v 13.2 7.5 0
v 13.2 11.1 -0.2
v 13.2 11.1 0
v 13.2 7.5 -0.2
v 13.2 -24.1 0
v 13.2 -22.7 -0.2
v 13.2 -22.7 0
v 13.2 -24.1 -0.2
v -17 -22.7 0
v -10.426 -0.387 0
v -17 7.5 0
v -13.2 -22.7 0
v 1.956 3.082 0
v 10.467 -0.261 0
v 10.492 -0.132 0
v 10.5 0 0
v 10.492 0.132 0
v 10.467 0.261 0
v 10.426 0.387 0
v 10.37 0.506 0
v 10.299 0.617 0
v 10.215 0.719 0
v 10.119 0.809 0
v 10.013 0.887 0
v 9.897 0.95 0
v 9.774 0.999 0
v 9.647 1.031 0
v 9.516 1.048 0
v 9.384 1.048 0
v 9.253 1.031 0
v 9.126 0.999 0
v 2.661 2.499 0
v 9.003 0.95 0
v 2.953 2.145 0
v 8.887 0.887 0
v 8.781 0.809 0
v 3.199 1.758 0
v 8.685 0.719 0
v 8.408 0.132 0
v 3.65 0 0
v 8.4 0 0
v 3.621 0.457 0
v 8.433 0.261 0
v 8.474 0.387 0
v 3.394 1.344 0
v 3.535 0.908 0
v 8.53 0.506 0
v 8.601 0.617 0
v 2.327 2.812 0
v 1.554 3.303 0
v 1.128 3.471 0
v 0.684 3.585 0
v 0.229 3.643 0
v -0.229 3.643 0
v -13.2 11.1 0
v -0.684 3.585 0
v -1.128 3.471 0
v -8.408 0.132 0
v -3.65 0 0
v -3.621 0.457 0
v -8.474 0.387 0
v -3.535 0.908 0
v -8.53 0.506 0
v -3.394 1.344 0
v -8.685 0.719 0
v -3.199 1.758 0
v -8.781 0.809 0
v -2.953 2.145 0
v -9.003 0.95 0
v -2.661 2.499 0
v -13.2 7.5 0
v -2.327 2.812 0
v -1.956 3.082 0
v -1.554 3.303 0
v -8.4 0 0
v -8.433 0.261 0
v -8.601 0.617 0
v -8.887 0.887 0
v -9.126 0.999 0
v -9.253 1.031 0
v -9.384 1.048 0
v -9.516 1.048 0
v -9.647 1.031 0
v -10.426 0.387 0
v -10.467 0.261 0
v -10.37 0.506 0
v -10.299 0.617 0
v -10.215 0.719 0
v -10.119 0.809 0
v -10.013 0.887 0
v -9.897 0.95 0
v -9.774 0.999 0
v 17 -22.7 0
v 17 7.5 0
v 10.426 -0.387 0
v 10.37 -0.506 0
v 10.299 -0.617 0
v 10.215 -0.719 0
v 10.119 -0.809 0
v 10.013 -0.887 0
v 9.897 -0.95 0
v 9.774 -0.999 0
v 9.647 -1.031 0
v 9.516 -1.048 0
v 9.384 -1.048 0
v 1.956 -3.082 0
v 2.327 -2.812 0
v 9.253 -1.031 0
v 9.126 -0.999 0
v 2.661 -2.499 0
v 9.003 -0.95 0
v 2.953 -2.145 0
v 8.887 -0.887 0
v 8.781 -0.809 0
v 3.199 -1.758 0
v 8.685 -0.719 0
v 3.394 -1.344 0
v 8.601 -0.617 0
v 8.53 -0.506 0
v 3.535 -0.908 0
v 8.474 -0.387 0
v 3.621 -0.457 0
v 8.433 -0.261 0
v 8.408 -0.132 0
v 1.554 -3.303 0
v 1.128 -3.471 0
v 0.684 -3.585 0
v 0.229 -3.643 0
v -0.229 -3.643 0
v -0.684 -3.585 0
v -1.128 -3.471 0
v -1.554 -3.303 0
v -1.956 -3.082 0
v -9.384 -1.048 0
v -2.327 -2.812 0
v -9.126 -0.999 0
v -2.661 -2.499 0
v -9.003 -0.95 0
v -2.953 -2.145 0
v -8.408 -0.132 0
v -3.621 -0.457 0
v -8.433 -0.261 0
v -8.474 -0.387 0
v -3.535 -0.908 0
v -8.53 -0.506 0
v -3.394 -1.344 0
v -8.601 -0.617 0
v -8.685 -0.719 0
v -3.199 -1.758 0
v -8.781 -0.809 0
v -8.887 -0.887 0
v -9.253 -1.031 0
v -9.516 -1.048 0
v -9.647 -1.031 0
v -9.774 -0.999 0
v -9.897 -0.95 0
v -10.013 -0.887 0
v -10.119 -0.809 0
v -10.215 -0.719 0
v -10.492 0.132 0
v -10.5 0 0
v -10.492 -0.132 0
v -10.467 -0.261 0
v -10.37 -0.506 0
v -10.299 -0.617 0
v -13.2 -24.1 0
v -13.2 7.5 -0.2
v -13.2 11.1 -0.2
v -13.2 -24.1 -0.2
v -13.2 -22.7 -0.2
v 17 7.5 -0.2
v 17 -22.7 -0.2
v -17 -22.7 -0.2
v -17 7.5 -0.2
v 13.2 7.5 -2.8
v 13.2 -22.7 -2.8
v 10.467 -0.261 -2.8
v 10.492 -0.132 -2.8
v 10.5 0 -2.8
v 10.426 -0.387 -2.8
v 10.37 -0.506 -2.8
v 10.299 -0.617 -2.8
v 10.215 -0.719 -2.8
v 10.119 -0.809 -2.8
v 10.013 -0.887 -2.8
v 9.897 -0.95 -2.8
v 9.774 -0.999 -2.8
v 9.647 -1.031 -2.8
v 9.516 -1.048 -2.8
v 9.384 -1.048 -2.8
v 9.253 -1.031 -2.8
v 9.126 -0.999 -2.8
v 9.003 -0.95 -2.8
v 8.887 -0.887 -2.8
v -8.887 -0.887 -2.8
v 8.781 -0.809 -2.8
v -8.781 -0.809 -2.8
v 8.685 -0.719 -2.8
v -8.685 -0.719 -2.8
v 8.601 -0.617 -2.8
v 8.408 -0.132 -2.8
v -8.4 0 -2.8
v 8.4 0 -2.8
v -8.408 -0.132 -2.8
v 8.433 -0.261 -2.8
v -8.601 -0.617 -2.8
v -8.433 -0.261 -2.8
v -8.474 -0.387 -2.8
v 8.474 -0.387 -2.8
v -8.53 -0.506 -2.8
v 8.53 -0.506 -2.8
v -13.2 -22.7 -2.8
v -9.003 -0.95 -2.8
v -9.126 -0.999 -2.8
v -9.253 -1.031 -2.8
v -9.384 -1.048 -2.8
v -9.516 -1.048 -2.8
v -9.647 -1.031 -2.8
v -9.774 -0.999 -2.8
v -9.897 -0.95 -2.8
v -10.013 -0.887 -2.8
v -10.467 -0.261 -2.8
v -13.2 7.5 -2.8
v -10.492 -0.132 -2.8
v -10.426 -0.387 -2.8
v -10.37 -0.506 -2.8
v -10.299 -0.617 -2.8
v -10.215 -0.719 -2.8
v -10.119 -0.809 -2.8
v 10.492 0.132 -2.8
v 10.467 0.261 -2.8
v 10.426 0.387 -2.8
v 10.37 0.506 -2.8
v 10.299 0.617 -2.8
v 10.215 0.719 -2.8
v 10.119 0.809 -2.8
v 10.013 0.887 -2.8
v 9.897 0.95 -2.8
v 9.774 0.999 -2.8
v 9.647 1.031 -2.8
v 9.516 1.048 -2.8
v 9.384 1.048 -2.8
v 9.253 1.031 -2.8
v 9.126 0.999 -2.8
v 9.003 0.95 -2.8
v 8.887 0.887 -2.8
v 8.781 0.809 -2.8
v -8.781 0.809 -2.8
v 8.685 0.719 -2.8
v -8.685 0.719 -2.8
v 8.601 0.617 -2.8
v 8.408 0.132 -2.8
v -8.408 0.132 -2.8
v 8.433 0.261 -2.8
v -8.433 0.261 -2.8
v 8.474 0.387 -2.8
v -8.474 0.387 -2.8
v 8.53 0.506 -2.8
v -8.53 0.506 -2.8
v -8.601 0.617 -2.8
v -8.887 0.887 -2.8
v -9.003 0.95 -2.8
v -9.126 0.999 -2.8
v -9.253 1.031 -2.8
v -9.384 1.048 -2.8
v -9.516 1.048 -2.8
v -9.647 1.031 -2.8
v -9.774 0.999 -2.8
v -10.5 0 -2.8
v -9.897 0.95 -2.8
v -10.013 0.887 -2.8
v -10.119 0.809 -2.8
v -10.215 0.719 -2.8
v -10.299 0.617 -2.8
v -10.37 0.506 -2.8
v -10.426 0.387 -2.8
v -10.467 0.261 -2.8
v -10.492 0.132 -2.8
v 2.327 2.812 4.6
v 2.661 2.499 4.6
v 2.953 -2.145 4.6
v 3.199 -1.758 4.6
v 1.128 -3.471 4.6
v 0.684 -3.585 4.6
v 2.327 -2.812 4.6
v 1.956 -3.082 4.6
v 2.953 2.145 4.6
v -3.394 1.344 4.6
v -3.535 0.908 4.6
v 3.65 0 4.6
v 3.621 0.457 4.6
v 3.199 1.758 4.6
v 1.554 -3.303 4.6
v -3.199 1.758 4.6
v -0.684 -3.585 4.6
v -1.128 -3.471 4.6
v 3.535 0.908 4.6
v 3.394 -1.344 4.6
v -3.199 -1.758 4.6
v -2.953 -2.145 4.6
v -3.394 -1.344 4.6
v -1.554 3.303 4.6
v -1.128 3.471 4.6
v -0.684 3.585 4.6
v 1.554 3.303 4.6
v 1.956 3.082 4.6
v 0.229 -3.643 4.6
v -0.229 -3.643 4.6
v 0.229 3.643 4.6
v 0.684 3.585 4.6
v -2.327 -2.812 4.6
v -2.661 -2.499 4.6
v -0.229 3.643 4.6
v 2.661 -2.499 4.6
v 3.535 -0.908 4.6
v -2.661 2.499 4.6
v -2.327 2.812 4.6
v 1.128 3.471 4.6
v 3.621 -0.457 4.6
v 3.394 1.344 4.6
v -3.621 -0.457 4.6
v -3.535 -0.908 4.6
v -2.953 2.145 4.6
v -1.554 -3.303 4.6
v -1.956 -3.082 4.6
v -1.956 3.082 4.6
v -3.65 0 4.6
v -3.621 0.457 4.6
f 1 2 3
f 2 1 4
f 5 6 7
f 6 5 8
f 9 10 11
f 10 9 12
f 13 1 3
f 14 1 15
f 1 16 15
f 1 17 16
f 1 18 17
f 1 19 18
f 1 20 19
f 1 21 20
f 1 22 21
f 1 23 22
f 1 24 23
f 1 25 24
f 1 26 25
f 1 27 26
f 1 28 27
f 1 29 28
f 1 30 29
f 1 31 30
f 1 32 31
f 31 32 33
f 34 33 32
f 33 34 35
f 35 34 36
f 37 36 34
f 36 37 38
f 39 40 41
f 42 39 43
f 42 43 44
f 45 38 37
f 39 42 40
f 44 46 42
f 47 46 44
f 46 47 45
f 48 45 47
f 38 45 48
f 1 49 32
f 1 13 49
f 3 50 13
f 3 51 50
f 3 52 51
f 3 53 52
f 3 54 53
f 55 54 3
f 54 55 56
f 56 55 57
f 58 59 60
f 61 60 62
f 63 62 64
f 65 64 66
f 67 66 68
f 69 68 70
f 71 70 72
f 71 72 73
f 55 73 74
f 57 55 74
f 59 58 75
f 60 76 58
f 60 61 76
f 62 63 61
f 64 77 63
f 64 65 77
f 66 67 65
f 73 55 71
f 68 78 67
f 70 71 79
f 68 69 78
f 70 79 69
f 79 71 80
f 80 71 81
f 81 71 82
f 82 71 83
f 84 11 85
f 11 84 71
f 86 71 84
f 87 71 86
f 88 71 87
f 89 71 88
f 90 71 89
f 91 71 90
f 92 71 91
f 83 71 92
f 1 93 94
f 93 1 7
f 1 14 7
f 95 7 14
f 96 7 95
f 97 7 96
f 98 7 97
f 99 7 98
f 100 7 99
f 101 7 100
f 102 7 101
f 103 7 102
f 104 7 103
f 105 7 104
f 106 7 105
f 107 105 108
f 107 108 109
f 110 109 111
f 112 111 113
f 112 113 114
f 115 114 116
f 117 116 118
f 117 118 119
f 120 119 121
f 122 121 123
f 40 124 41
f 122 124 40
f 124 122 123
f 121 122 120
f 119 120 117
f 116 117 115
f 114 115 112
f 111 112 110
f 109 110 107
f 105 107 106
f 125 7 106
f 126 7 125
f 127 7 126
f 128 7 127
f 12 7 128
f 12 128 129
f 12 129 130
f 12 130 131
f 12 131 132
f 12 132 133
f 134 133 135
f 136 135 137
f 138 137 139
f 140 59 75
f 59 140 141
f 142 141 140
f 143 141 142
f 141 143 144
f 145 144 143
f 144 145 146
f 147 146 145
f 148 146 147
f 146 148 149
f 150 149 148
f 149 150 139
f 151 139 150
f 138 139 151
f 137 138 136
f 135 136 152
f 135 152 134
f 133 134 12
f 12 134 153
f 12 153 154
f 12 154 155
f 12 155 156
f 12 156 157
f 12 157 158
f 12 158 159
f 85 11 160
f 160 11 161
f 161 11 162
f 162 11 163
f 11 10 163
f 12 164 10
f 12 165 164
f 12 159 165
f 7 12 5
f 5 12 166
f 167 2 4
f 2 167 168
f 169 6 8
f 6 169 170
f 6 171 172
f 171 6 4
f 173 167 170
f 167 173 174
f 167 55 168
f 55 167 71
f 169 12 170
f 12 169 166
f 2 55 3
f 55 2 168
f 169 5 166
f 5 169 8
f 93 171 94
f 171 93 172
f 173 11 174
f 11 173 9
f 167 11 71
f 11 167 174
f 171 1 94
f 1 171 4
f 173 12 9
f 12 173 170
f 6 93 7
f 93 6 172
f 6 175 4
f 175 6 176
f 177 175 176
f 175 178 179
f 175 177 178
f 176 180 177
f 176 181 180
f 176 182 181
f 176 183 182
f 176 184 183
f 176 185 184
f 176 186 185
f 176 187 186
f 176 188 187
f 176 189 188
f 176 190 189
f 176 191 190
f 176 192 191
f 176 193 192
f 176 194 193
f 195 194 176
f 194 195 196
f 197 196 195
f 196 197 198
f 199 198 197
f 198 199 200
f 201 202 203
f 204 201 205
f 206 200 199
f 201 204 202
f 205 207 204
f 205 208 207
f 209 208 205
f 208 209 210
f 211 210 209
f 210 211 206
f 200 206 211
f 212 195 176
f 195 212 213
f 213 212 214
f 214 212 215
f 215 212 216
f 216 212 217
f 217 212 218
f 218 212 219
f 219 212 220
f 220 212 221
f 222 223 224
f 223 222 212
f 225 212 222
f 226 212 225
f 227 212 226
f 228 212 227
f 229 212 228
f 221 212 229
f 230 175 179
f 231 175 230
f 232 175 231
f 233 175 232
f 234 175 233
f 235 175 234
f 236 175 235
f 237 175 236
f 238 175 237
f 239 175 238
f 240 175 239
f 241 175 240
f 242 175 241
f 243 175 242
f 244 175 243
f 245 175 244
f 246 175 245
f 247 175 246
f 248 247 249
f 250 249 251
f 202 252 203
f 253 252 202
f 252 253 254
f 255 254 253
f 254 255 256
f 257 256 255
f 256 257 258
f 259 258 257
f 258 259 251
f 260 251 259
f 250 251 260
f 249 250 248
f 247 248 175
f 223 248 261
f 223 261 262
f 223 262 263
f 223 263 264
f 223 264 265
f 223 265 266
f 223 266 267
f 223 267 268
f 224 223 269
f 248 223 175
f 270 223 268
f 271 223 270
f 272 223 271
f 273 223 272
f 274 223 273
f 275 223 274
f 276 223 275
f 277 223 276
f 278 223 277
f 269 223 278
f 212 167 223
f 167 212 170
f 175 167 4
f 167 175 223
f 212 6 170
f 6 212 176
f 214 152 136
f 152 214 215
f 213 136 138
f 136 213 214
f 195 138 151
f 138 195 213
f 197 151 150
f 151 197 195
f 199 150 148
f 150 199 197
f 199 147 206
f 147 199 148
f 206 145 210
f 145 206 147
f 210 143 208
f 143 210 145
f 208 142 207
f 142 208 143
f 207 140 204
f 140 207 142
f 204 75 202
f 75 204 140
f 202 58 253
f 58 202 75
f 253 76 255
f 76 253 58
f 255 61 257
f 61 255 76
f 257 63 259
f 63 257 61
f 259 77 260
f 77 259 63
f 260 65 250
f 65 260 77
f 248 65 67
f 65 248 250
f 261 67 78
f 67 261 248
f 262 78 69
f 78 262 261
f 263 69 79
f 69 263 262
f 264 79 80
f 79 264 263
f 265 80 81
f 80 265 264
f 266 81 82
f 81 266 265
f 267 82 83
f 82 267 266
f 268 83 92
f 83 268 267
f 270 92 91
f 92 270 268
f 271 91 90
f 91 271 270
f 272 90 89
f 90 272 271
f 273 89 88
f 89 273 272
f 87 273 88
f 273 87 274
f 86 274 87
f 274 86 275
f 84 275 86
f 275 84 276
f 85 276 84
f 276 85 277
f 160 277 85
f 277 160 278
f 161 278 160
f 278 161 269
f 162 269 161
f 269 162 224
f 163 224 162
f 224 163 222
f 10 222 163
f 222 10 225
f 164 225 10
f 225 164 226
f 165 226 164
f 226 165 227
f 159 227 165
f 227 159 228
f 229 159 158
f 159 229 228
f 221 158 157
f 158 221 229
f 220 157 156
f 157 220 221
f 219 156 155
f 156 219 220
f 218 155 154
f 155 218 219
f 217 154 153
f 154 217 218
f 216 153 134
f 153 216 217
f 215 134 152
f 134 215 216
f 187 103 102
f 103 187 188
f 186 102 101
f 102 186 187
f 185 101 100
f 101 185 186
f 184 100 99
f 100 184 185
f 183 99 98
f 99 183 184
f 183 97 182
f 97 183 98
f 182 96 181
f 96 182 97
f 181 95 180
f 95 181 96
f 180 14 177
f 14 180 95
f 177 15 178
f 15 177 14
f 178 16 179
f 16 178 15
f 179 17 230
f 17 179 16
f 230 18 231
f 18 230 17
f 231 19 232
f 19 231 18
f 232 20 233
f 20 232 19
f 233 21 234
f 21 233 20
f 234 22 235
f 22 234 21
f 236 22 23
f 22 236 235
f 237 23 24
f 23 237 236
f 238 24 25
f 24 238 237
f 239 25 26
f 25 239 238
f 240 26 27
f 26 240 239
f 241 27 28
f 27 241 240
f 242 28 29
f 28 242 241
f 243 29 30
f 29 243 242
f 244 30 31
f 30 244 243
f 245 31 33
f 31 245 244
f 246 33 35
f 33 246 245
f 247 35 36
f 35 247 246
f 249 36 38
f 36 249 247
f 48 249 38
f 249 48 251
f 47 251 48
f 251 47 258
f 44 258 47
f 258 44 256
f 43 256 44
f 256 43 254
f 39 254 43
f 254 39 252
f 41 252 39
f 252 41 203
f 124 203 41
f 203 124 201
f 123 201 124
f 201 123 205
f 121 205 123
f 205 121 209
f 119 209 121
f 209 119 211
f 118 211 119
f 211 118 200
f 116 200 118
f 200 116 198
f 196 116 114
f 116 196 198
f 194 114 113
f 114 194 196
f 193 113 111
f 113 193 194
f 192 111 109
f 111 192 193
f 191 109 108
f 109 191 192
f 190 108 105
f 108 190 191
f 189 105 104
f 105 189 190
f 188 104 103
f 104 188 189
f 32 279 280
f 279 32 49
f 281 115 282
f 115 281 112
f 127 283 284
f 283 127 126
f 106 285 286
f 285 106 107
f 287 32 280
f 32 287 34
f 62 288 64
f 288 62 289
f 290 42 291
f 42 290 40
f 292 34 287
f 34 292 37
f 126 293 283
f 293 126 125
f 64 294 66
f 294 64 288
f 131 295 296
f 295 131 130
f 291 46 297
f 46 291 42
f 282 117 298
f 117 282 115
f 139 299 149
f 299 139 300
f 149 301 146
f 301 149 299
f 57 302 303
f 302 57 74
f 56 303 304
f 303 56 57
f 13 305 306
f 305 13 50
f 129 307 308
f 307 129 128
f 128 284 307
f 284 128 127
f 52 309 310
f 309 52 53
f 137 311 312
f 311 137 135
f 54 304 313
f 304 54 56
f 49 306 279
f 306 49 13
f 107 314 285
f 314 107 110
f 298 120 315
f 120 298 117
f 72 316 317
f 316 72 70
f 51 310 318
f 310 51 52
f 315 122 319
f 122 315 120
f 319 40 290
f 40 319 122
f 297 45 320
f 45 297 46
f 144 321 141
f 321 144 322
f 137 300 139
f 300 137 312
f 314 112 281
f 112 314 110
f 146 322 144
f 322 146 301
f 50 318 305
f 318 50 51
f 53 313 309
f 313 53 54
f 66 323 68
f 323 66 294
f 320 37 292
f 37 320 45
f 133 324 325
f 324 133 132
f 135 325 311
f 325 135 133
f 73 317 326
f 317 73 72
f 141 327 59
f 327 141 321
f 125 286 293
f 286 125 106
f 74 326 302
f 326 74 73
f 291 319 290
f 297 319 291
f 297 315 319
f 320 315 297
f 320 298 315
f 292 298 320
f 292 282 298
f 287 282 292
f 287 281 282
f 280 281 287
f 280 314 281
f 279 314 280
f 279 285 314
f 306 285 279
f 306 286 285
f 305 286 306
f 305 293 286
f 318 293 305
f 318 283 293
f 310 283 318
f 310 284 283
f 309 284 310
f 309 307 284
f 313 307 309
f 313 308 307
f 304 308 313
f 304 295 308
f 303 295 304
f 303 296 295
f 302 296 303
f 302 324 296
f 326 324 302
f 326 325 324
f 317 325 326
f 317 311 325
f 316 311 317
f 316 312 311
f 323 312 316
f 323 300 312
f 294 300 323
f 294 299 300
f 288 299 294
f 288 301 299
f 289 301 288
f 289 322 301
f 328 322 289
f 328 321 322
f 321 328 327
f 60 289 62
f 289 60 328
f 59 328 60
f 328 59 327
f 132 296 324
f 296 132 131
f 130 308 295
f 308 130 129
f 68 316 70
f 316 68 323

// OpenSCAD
// file: ../lib/layout.scad
FN = 50;

// millemethers
KEY_BETWEEN = 19.05; // 1u size

PLATE_BOARD_LEDGE = 2.00;

KEY_MOUNT = 14.0; // 13.8 ?
KEY_MOUNT_OUT = 15.4;
// KEY_CAP = 18.2;
PLATE_MOUNT = KEY_BETWEEN;
BOARD_MOUNT = PLATE_MOUNT + PLATE_BOARD_LEDGE * 2;

OUTLINE = (PLATE_MOUNT - KEY_MOUNT) / 2;

SCREW_HOLE = 2.1;
HOLE_KEY_X_OFFSET = 0.3; // HACK empiric value

// degree
HALF_TILT = 20.0;

// 1u
HALF_GAP = 1.51 * KEY_BETWEEN;

// [0.00, 0.75] [0.75, 3.75] -> x, y offset of edge key mounts
BRIDGE_BOTTOM =
  (0.00 * KEY_BETWEEN + HALF_GAP) * sin(HALF_TILT) +
  (0.75 * KEY_BETWEEN) * cos(HALF_TILT);
BRIDGE_TOP =
  (0.75 * KEY_BETWEEN + HALF_GAP) * sin(HALF_TILT) +
  (3.75 * KEY_BETWEEN) * cos(HALF_TILT);
BRIDGE_WIDTH = HALF_GAP + KEY_BETWEEN; // HACK empiric value

// 1u sizes
RIGHT_HAND_KEYS = [
  [0.75, 3.50], [1.75, 3.75], [2.75, 4.00], [3.75, 3.75], [4.75, 3.25],
  [0.75, 2.50], [1.75, 2.75], [2.75, 3.00], [3.75, 2.75], [4.75, 2.25],
  [0.75, 1.50], [1.75, 1.75], [2.75, 2.00], [3.75, 1.75], [4.75, 1.25],
  [0.00, 0.00], [1.00, 0.25], [2.00, 0.50],
  [5.75, 1.50], [5.75, 2.50]
];

RIGHT_HAND_PLATE_ADD = [
  [1.00, 1.00], [1.75, 1.00]
];

RIGHT_HAND_BOARD_ADD = [
  [0.75, 1.00], [2.00, 0.75], [2.75, 1.75]
];

BRIDGE_ADD = [
  [0.75, 3.25], [0.00, 0.00],
];

BRIDGE_PLATE = [
  [-BRIDGE_WIDTH, BRIDGE_BOTTOM],
  [BRIDGE_WIDTH, BRIDGE_BOTTOM],
  [BRIDGE_WIDTH, BRIDGE_TOP],
  [-BRIDGE_WIDTH, BRIDGE_TOP]
];

BRIDGE_BOARD = [
  [-BRIDGE_WIDTH, BRIDGE_BOTTOM - PLATE_BOARD_LEDGE],
  [BRIDGE_WIDTH, BRIDGE_BOTTOM - PLATE_BOARD_LEDGE],
  [BRIDGE_WIDTH, BRIDGE_TOP + PLATE_BOARD_LEDGE],
  [-BRIDGE_WIDTH, BRIDGE_TOP + PLATE_BOARD_LEDGE]
];
// main file
include <../lib/layout.scad>

TRACKPOINT_OFFSET = 66; // HACK empiric value

module translate_trackpoint()
  translate([0, TRACKPOINT_OFFSET, 0])
    children();

module trackpoint_mount_holes()
  let(r = SCREW_HOLE/2, o = 18.9/2) {
    translate([-o, 0, 0])
      circle(r = r, $fn = FN);
    translate([o, 0, 0])
      circle(r = r, $fn = FN);
  }

module trackpoint_hole()
  circle(r = 9/2, $fn = FN);

module trackpoint() {
  color("Red")
  translate([0, 0, (7.4-2.8)/2], $fn = FN)
    cylinder(r=7.3/2, h=7.4-2.8, center=true);
  color("Gainsboro")
    difference() {
      translate([0, -30.2/2 + 7.5, 0])
        union() {
          translate([0, 5.0/2 -1.4, -0.2/2])
            cube(size = [26.4, 35.2, 0.2], center = true);
          translate([0, 0, -0.2/2])
            cube(size = [34.0, 30.2, 0.2], center = true);
          translate([0, 0, -2.8/2])
            cube(size = [26.4, 30.2, 2.8], center = true);
        }
      translate([0, 0, -2.81])
        linear_extrude(height = 2.82)
          trackpoint_mount_holes();
    }
}

difference() {
  trackpoint();
  translate([0, 0, -2.81])
    linear_extrude(height = 2.82)
      trackpoint_mount_holes();
}
